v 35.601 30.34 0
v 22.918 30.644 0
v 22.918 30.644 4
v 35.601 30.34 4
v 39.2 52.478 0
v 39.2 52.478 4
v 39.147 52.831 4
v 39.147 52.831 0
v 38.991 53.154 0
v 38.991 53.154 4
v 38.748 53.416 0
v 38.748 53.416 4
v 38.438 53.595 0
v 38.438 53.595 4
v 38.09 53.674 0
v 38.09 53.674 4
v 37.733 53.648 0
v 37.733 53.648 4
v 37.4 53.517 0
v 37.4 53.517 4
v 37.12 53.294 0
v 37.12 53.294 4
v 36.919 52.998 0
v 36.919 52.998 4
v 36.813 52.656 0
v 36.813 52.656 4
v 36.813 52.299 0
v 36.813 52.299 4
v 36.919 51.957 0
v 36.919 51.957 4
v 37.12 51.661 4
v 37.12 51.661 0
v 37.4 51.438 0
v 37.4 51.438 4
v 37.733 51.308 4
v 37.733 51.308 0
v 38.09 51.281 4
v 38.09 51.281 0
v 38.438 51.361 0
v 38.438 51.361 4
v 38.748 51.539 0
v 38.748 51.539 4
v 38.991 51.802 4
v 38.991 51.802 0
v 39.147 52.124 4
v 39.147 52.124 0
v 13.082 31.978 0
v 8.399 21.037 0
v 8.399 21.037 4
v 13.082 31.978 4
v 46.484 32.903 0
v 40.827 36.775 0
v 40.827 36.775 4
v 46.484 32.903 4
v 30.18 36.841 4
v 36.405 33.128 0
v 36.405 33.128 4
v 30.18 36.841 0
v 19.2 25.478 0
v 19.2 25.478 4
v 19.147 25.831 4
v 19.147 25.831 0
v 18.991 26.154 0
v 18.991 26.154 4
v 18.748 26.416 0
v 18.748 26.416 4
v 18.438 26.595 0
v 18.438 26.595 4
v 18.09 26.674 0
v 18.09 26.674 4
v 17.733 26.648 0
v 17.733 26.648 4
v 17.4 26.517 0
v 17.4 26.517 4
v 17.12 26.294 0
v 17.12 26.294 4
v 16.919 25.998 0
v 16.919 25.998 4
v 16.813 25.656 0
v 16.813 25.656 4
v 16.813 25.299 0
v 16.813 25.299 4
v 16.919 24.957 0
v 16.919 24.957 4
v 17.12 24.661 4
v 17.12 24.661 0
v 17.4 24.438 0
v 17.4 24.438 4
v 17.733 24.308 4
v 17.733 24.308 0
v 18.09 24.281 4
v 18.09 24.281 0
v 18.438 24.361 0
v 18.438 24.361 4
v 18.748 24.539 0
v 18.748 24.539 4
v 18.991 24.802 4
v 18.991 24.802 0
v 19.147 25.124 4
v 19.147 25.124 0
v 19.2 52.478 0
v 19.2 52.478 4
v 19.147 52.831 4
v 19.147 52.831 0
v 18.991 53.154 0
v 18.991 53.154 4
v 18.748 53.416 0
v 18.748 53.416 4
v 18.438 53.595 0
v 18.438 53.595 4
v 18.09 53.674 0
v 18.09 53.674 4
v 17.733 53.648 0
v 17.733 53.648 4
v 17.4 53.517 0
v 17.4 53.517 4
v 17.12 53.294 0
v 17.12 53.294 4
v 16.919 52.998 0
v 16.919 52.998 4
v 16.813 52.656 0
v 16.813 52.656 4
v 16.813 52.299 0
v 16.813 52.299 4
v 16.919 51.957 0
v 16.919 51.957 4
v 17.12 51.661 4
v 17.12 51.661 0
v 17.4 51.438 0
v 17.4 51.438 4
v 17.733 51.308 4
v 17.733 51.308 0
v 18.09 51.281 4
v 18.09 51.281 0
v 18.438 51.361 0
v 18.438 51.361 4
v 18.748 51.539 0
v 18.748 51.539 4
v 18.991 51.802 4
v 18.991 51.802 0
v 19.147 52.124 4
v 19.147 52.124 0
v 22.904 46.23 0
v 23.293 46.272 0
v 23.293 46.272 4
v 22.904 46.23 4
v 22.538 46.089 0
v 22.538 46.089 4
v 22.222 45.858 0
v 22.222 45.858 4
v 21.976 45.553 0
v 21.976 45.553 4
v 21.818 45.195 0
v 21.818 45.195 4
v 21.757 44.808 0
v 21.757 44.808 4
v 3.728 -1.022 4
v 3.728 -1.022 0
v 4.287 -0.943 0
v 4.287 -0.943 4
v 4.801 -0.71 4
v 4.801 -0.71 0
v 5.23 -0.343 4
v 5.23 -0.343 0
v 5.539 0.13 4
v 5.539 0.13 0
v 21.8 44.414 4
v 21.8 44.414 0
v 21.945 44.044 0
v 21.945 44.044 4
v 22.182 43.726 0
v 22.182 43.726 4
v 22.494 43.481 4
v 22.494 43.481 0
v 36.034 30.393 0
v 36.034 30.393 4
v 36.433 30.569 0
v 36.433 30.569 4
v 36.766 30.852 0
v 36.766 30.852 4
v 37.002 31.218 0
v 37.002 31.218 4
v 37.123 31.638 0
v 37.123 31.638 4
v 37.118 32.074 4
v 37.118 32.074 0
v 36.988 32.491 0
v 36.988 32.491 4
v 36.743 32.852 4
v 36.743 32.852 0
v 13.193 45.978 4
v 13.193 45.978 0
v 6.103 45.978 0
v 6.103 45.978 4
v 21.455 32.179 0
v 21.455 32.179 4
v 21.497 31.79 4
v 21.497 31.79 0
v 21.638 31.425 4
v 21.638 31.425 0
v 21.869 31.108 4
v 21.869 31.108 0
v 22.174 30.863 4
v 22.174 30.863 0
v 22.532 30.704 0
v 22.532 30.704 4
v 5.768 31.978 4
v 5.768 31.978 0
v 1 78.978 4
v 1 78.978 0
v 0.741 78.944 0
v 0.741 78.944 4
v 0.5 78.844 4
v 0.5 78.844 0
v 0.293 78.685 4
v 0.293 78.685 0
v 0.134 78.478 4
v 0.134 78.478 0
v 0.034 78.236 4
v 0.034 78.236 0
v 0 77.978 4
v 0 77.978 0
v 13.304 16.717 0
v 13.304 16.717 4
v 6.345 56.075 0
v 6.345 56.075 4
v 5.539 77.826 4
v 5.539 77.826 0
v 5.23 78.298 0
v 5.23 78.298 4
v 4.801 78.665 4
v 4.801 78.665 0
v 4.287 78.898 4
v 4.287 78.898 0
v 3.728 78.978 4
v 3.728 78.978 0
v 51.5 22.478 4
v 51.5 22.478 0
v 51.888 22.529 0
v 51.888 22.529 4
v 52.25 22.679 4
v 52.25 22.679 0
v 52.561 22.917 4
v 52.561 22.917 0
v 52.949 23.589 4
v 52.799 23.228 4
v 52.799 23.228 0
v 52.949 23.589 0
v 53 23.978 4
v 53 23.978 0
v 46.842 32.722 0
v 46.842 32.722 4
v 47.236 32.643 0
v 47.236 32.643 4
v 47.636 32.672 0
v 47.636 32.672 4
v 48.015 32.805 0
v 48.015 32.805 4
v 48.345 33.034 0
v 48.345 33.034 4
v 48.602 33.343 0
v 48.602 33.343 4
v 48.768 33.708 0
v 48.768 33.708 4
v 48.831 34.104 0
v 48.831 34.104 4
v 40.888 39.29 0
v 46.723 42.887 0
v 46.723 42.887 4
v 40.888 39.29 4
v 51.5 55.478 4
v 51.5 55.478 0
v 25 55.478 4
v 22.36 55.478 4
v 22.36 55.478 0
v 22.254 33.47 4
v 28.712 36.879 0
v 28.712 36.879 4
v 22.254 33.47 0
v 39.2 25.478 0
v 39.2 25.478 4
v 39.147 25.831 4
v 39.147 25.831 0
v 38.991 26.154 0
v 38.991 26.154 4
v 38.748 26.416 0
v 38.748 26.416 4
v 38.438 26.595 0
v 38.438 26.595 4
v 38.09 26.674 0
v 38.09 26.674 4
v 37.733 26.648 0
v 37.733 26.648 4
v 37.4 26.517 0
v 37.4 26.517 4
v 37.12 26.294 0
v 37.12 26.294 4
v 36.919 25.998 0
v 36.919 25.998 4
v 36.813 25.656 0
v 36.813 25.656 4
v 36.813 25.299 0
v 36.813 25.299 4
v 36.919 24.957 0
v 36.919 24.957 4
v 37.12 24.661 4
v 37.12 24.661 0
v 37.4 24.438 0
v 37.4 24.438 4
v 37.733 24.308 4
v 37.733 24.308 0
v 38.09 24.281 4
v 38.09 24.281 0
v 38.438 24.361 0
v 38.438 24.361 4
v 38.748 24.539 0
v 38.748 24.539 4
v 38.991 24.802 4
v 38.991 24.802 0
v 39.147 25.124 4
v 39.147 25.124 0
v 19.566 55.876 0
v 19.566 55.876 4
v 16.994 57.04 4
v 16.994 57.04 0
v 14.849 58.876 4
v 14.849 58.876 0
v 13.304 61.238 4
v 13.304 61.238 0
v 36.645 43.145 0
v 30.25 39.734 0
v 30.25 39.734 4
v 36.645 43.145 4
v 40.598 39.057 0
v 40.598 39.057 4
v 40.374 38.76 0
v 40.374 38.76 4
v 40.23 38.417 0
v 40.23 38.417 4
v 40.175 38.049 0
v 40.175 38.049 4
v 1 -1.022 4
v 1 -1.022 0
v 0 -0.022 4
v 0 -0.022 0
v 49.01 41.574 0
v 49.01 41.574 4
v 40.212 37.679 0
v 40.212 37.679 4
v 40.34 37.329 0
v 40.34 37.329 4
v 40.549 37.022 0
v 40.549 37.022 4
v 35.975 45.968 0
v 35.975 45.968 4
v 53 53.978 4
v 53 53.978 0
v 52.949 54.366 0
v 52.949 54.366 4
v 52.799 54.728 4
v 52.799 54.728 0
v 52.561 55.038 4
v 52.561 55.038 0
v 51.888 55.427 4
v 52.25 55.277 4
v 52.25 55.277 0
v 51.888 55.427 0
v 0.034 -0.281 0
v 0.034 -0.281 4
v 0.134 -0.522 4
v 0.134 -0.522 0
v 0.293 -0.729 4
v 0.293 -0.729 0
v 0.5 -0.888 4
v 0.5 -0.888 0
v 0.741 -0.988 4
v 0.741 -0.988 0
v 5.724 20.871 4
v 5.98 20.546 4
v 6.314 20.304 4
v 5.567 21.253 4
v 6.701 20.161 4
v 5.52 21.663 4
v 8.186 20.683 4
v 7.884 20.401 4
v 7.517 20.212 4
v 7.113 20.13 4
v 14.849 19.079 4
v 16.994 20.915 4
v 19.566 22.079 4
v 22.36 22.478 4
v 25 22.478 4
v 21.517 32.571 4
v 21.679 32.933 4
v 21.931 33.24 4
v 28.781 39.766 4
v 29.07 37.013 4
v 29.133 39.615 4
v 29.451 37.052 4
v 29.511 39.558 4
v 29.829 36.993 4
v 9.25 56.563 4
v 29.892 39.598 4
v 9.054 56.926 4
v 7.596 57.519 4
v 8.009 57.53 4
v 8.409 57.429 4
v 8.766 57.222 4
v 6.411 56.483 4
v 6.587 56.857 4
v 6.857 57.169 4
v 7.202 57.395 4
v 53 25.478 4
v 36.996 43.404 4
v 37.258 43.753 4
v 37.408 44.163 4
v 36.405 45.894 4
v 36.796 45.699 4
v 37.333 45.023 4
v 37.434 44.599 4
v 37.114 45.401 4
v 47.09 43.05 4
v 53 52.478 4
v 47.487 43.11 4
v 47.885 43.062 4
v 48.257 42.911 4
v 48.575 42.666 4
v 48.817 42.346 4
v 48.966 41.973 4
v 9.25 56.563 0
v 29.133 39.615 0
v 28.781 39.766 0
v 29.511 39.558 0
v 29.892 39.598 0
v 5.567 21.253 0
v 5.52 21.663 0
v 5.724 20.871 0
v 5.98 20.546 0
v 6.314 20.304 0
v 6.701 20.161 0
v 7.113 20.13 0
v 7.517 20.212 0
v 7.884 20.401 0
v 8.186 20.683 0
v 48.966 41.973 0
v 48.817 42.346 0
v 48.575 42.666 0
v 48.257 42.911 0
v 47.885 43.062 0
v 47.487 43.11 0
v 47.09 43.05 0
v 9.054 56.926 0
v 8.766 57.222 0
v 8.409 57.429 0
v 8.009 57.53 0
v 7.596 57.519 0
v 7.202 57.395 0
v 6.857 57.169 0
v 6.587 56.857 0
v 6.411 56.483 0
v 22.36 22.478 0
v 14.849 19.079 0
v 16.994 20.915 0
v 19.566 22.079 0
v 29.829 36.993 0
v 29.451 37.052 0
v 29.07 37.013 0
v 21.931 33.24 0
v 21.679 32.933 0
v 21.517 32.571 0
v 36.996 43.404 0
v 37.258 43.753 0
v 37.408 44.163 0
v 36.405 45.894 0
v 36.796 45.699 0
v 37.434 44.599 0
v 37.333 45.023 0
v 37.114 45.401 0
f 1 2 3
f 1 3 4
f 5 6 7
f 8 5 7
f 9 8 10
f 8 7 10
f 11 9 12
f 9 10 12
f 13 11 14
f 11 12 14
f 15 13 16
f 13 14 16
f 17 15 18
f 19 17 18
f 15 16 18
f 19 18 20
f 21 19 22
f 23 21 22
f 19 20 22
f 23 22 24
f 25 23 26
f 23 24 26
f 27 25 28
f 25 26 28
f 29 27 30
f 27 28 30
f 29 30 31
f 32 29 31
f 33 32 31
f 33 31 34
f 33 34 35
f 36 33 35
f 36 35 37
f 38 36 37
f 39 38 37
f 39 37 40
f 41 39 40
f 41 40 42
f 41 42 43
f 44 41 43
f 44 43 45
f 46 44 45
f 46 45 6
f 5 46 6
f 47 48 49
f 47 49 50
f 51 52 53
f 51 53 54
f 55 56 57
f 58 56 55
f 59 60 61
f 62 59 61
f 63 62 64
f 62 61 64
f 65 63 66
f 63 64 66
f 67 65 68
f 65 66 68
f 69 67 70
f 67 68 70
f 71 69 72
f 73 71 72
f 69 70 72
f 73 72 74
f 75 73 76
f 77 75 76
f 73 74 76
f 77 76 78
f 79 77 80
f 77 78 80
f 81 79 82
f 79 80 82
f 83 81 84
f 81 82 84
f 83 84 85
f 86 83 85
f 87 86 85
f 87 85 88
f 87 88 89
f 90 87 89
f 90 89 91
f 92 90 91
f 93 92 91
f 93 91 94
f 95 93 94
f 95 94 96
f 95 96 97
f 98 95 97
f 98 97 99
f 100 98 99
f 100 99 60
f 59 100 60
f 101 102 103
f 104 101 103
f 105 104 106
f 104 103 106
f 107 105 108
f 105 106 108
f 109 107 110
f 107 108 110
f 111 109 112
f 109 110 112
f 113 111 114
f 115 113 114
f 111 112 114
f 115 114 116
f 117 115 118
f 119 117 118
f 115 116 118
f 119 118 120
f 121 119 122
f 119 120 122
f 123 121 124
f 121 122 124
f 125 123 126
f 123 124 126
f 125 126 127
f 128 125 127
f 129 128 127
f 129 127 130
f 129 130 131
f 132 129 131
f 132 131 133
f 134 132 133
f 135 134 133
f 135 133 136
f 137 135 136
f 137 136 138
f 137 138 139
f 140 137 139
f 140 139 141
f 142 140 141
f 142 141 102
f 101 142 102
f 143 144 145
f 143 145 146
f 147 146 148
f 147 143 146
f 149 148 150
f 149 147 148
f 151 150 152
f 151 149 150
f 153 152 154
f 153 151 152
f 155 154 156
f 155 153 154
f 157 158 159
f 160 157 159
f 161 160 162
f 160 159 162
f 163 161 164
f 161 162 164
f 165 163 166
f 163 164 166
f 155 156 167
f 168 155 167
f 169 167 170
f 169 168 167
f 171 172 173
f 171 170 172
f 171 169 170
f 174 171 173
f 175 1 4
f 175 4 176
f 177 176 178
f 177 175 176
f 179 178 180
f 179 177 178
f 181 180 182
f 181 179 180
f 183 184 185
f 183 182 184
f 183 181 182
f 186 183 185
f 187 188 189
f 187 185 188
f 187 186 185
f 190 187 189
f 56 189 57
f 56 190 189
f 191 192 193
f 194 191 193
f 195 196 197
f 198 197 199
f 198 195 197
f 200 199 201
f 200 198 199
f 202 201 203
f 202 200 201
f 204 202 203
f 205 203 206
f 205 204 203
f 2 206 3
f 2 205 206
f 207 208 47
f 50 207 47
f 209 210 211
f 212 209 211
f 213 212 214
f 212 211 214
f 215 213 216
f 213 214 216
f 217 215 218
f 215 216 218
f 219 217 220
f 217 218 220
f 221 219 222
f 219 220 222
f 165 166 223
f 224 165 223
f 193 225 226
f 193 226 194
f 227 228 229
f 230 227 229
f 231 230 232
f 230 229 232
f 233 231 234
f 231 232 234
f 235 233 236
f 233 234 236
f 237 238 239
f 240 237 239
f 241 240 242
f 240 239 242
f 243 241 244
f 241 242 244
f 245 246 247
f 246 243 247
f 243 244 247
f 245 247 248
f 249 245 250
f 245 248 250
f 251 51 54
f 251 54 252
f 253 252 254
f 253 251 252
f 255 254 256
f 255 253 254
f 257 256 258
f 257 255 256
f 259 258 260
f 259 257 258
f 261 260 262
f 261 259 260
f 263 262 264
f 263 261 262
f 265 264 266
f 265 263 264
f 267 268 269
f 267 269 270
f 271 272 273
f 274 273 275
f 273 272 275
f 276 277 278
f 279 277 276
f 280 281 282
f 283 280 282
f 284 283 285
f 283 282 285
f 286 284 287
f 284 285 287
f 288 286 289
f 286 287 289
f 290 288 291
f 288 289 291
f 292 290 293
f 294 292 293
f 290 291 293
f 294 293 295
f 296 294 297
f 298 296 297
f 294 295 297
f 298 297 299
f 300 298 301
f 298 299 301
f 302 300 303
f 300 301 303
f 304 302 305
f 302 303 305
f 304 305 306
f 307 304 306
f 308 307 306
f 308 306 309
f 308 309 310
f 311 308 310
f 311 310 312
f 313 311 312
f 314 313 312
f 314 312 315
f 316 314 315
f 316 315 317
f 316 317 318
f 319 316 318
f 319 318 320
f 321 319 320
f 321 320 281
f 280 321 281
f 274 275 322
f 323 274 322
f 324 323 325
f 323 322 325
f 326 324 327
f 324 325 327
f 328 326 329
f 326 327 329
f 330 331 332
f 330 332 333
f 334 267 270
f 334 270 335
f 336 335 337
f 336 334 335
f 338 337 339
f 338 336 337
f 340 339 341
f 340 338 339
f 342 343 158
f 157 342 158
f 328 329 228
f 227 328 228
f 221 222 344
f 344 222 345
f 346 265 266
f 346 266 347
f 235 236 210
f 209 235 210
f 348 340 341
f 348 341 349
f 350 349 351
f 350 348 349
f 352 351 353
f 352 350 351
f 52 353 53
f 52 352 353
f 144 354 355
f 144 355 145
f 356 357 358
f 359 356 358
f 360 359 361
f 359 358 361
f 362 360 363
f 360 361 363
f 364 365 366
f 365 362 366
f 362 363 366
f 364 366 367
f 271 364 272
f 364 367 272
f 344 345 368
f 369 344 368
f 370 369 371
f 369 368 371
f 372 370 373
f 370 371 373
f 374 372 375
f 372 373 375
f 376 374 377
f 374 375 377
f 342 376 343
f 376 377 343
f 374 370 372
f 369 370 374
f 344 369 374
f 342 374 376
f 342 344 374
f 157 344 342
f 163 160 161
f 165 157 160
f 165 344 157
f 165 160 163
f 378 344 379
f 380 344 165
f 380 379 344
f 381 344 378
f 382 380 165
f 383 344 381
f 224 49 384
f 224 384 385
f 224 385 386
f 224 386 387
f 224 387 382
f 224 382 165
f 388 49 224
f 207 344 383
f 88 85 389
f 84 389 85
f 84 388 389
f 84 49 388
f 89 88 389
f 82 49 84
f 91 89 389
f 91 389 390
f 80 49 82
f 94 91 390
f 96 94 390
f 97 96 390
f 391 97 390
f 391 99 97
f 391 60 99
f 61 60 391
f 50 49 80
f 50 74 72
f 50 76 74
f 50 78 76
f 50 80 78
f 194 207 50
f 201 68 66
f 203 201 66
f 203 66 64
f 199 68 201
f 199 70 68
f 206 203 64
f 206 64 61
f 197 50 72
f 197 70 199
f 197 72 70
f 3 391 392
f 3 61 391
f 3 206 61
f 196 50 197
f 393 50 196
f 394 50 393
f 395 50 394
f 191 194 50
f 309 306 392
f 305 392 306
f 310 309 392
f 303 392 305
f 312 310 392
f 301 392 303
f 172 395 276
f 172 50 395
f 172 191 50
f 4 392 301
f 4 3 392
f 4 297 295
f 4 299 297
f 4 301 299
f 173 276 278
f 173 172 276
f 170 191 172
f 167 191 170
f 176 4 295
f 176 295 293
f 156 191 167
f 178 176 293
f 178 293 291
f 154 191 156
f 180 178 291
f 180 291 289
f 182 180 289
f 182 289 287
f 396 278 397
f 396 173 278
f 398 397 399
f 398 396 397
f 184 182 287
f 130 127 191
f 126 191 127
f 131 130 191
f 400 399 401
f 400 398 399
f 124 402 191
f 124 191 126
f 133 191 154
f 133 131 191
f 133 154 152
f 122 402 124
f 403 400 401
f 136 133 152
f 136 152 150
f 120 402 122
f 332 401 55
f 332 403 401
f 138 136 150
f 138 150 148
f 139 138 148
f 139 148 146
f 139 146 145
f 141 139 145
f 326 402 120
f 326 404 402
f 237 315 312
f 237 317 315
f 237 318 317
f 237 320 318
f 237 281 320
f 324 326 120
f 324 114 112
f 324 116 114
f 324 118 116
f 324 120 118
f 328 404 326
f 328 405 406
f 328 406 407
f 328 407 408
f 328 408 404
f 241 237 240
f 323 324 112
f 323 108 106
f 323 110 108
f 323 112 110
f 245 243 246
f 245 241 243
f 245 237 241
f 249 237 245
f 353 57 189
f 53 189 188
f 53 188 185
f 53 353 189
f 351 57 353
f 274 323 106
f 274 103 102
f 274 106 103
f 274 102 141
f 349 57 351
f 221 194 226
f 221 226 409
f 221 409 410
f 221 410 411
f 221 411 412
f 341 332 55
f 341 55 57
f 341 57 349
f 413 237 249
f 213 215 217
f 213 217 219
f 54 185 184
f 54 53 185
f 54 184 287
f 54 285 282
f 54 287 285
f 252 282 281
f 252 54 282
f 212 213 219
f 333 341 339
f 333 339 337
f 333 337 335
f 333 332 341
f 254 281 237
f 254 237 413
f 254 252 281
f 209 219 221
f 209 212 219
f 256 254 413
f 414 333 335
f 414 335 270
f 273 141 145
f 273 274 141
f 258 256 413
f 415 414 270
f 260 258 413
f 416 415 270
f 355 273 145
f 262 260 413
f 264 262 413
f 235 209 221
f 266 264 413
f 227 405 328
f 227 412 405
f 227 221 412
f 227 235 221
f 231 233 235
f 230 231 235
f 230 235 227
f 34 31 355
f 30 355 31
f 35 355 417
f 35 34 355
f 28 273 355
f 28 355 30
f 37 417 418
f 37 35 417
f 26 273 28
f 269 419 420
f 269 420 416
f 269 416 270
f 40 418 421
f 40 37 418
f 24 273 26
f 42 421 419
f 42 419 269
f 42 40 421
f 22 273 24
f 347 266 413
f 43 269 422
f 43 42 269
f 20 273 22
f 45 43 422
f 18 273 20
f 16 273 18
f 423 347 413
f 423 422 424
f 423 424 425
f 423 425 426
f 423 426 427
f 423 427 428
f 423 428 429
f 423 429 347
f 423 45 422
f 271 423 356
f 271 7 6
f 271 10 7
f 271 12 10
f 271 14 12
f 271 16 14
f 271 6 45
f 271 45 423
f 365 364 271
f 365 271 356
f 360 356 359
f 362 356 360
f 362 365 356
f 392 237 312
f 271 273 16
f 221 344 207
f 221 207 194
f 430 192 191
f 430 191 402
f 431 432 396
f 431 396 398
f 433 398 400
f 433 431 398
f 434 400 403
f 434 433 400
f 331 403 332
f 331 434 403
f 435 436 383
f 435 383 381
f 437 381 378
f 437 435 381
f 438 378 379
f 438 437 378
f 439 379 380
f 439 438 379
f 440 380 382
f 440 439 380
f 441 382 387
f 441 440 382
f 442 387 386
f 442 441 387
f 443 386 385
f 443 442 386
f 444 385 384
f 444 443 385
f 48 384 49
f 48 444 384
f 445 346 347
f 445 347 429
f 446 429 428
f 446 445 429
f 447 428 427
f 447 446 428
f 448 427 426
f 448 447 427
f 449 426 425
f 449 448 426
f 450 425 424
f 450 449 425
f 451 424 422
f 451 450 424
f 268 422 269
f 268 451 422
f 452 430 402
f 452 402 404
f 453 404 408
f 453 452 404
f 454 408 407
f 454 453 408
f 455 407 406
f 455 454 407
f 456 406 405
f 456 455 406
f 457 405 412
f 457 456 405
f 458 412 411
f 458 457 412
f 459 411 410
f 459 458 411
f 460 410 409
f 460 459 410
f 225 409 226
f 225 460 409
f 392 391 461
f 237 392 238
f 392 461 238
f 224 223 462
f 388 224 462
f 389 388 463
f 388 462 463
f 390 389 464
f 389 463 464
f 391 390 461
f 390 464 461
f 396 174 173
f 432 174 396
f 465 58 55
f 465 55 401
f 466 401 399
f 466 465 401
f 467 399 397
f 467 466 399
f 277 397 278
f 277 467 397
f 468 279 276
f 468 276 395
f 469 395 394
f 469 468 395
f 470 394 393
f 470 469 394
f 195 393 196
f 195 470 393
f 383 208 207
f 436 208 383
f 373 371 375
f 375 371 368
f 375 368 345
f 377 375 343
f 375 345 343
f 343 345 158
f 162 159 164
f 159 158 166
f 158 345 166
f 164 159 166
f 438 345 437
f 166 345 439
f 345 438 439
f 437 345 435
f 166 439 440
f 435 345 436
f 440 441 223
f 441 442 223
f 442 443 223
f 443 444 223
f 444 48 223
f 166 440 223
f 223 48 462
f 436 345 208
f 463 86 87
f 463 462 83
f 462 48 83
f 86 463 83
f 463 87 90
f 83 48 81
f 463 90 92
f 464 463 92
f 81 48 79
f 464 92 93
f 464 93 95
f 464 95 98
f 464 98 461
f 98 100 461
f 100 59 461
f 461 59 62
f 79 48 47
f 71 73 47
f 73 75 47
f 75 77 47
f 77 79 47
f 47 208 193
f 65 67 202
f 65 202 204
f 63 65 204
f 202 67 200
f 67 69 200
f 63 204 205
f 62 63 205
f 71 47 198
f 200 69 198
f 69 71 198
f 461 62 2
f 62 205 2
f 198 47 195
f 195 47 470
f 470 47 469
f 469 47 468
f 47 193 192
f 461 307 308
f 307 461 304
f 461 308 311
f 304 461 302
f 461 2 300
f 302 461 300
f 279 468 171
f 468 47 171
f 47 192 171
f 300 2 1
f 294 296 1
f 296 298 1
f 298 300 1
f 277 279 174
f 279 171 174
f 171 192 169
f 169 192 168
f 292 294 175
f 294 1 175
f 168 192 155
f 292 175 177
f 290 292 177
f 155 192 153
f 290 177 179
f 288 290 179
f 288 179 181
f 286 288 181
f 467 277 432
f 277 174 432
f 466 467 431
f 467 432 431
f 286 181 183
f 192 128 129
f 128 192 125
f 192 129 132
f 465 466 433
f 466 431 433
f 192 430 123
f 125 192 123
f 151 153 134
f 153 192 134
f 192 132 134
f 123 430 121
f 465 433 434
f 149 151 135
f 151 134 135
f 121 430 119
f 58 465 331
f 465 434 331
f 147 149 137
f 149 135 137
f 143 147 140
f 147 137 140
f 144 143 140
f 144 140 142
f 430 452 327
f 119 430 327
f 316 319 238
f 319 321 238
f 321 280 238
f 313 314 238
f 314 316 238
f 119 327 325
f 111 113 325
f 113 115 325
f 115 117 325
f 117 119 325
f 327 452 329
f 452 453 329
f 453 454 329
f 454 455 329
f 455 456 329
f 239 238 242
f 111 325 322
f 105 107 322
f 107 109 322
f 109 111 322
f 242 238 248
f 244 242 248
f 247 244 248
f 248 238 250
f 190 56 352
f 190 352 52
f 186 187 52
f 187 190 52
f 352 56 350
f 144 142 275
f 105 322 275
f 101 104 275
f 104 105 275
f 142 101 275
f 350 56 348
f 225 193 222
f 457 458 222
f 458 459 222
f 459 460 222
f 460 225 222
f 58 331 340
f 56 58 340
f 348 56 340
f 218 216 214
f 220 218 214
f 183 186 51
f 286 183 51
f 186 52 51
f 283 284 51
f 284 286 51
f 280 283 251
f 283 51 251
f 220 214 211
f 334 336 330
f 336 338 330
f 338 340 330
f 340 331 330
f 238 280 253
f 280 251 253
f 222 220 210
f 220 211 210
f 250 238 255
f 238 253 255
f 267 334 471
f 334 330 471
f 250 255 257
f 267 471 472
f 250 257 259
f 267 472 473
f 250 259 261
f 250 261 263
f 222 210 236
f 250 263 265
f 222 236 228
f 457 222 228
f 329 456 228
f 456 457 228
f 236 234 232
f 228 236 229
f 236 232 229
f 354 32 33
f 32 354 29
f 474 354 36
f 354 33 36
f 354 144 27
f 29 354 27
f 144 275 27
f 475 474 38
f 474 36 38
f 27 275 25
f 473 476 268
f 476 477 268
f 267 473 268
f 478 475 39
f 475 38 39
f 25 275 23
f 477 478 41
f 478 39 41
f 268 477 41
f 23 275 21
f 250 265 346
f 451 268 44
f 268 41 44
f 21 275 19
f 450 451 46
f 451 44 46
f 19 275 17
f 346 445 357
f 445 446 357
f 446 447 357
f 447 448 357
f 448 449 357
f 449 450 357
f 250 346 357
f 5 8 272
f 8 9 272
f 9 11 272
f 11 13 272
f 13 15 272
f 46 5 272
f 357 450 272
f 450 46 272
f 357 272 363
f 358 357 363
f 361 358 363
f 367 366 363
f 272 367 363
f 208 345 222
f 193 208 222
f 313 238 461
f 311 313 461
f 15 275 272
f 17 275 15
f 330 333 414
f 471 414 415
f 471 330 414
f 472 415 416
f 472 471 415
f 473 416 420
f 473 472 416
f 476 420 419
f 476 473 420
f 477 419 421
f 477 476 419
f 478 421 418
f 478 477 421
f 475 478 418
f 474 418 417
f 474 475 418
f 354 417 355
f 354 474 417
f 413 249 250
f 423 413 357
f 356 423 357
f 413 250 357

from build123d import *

# Parameters (mm, degrees)
EXTRUDE_1_DEPTH     = 11
CUT_EXTRUDE_START   = -7
CUT_EXTRUDE_1_DEPTH = 7
SKETCH_3_R          = 2.05
CUT_EXTRUDE_2_DEPTH = 37
FILLET_1_R          = 2
EXTRUDE_START       = -4
EXTRUDE_2_DEPTH     = 4
SKETCH_5_W          = 34.461524683
SKETCH_5_H          = 8.345685775
CUT_EXTRUDE_3_DEPTH = 34
SKETCH_6_R          = 1.2
CUT_EXTRUDE_4_DEPTH = 10


with BuildPart() as part:
    # 草图1 → 凸台-拉伸1 (new body)
    with BuildSketch(Plane.XY):
        with BuildLine():
            Line((3.72790966, 78.977626184), (1, 78.977626184))
            ThreePointArc((1, 78.977626184), (0.292893219, 78.684732965), (0, 77.977626184))
            Line((0, 77.977626184), (0, -0.022373816))
            ThreePointArc((0, -0.022373816), (0.292893219, -0.729480597), (1, -1.022373816))
            Line((1, -1.022373816), (3.72790966, -1.022373816))
            ThreePointArc((3.72790966, -1.022373816), (4.801278091, -0.709940174), (5.539290113, 0.129745972))
            Line((5.539290113, 0.129745972), (13.303549433, 16.717027245))
            ThreePointArc((13.303549433, 16.717027245), (16.993609545, 20.915457973), (22.360451698, 22.477626184))
            Line((22.360451698, 22.477626184), (51.5, 22.477626184))
            ThreePointArc((51.5, 22.477626184), (52.560660172, 22.916966012), (53, 23.977626184))
            Line((53, 23.977626184), (53, 53.977626184))
            ThreePointArc((53, 53.977626184), (52.560660172, 55.038286356), (51.5, 55.477626184))
            Line((51.5, 55.477626184), (22.360451698, 55.477626184))
            ThreePointArc((22.360451698, 55.477626184), (16.993609545, 57.039794395), (13.303549433, 61.238225124))
            Line((13.303549433, 61.238225124), (5.539290113, 77.825506396))
            ThreePointArc((5.539290113, 77.825506396), (4.801278091, 78.665192542), (3.72790966, 78.977626184))
        make_face()
        with BuildLine():
            Line((46.723063893, 42.88691809), (40.887588257, 39.289675292))
            ThreePointArc((40.887588257, 39.289675292), (40.373853978, 38.759625352), (40.175145399, 38.048716955))
            ThreePointArc((40.175145399, 38.048716955), (40.339583189, 37.329108685), (40.827345936, 36.77506595))
            Line((40.827345936, 36.77506595), (46.483868127, 32.90251016))
            ThreePointArc((46.483868127, 32.90251016), (48.014920506, 32.805104134), (48.830807058, 34.104310989))
            Line((48.830807058, 34.104310989), (49.009760503, 41.574109577))
            ThreePointArc((49.009760503, 41.574109577), (48.257024254, 42.91089582), (46.723063893, 42.88691809))
        make_face(mode=Mode.SUBTRACT)
        with BuildLine():
            Line((35.975157614, 45.967771208), (23.29289503, 46.27159929))
            ThreePointArc((23.29289503, 46.27159929), (22.222016888, 45.857788357), (21.757400208, 44.807954643))
            ThreePointArc((21.757400208, 44.807954643), (21.945365563, 44.044228792), (22.493939434, 43.480602267))
            Line((22.493939434, 43.480602267), (28.780793319, 39.766059947))
            ThreePointArc((28.780793319, 39.766059947), (29.511034587, 39.557845657), (30.249678725, 39.733943182))
            Line((30.249678725, 39.733943182), (36.645087423, 43.144657419))
            ThreePointArc((36.645087423, 43.144657419), (37.398702379, 44.814536207), (35.975157614, 45.967771208))
        make_face(mode=Mode.SUBTRACT)
        with BuildLine():
            Line((28.711627706, 36.878978358), (22.254110192, 33.469752057))
            ThreePointArc((22.254110192, 33.469752057), (21.679175619, 32.933041346), (21.454853835, 32.179192628))
            ThreePointArc((21.454853835, 32.179192628), (21.868664769, 31.108314486), (22.918498482, 30.643697806))
            Line((22.918498482, 30.643697806), (35.600761065, 30.339869724))
            ThreePointArc((35.600761065, 30.339869724), (37.077896972, 31.42361332), (36.405111016, 33.127664295))
            Line((36.405111016, 33.127664295), (30.180365947, 36.840718678))
            ThreePointArc((30.180365947, 36.840718678), (29.451001862, 37.051985174), (28.711627706, 36.878978358))
        make_face(mode=Mode.SUBTRACT)
        with BuildLine():
            Line((8.398953615, 21.036666397), (15.693636896, 38.077972893))
            ThreePointArc((15.693636896, 38.077972893), (15.814233328, 38.63232963), (15.720321381, 39.191825329))
            Line((15.720321381, 39.191825329), (9.25005307, 56.562897813))
            ThreePointArc((9.25005307, 56.562897813), (7.596092236, 57.518632984), (6.344825548, 56.075252289))
            Line((6.344825548, 56.075252289), (5.520410579, 21.66287331))
            ThreePointArc((5.520410579, 21.66287331), (6.701123529, 20.161229848), (8.398953615, 21.036666397))
        make_face(mode=Mode.SUBTRACT)
    extrude(amount=EXTRUDE_1_DEPTH)

    # 草图2 → 切除-拉伸1 (cut)
    with BuildSketch(Plane.XY.offset(11).offset(CUT_EXTRUDE_START)):
        with BuildLine():
            Line((23, 22.477626184), (23, 27.477626184))
            Line((23, 27.477626184), (53, 27.477626184))
            Line((53, 27.477626184), (53, 50.477626184))
            Line((53, 50.477626184), (23, 50.477626184))
            Line((23, 50.477626184), (23, 55.477626184))
            Line((23, 55.477626184), (22.360451698, 55.477626184))
            ThreePointArc((22.360451698, 55.477626184), (16.993609545, 57.039794395), (13.303549433, 61.238225124))
            Line((13.303549433, 61.238225124), (5.539290113, 77.825506396))
            ThreePointArc((5.539290113, 77.825506396), (4.801278091, 78.665192542), (3.72790966, 78.977626184))
            Line((3.72790966, 78.977626184), (1, 78.977626184))
            ThreePointArc((1, 78.977626184), (0.292893219, 78.684732965), (0, 77.977626184))
            Line((0, 77.977626184), (0, -0.022373816))
            ThreePointArc((0, -0.022373816), (0.292893219, -0.729480597), (1, -1.022373816))
            Line((1, -1.022373816), (3.72790966, -1.022373816))
            ThreePointArc((3.72790966, -1.022373816), (4.801278091, -0.709940174), (5.539290113, 0.129745972))
            Line((5.539290113, 0.129745972), (13.303549433, 16.717027245))
            ThreePointArc((13.303549433, 16.717027245), (16.993609545, 20.915457973), (22.360451698, 22.477626184))
            Line((22.360451698, 22.477626184), (23, 22.477626184))
        make_face()
    extrude(amount=CUT_EXTRUDE_1_DEPTH, mode=Mode.SUBTRACT)

    # 草图3 → 切除-拉伸2 (cut)
    with BuildSketch(Plane(origin=(0, 55.477626184, 0), x_dir=(1, 0, 0), z_dir=(0, 1, 0))):
        with Locations(Location((48, -8, 0), (0, 0, 180))):
            Circle(SKETCH_3_R)
        with Locations(Location((28, -8, 0), (0, 0, 180))):
            Circle(SKETCH_3_R)
    extrude(amount=-CUT_EXTRUDE_2_DEPTH, mode=Mode.SUBTRACT)

    # 圆角1
    fillet_1_edges = [part.edges().sort_by_distance(p)[0] for p in [
        (53, 50.477626184, 7.5),
        (53, 27.477626184, 7.5),
        (23, 27.477626184, 7.5),
        (23, 22.477626184, 7.5),
        (23, 55.477626184, 7.5),
        (23, 50.477626184, 7.5),
    ]]
    fillet(fillet_1_edges, radius=FILLET_1_R)

    # 草图4 → 凸台-拉伸2 (add)
    with BuildSketch(Plane.XY.offset(4).offset(EXTRUDE_START)):
        with BuildLine():
            Line((5.935218909, 38.977626184), (15.782413333, 38.977626184))
            ThreePointArc((15.782413333, 38.977626184), (15.755353714, 39.08588132), (15.720321381, 39.191825329))
            Line((15.720321381, 39.191825329), (13.192788767, 45.977626184))
            Line((13.192788767, 45.977626184), (6.102917422, 45.977626184))
            Line((6.102917422, 45.977626184), (5.935218909, 38.977626184))
        make_face()
        with BuildLine():
            Line((5.767520396, 31.977626184), (13.082329062, 31.977626184))
            Line((13.082329062, 31.977626184), (15.693636896, 38.077972893))
            ThreePointArc((15.693636896, 38.077972893), (15.807413415, 38.520952405), (15.782413333, 38.977626184))
            Line((15.782413333, 38.977626184), (5.935218909, 38.977626184))
            Line((5.935218909, 38.977626184), (5.767520396, 31.977626184))
        make_face()
    extrude(amount=EXTRUDE_2_DEPTH)

    # 草图5 → 切除-拉伸3 (cut)
    with BuildSketch(Plane(origin=(0, 55.477626184, 0), x_dir=(1, 0, 0), z_dir=(0, 1, 0))):
        with Locations((40.230762341, -8.172842887)):
            Rectangle(SKETCH_5_W, SKETCH_5_H)
    extrude(amount=-CUT_EXTRUDE_3_DEPTH, mode=Mode.SUBTRACT)

    # 草图6 → 切除-拉伸4 (cut)
    with BuildSketch(Plane.XY.offset(4)):
        with Locations((38, 52.477626184)):
            Circle(SKETCH_6_R)
        with Locations((18, 52.477626184)):
            Circle(SKETCH_6_R)
        with Locations((18, 25.477626184)):
            Circle(SKETCH_6_R)
        with Locations((38, 25.477626184)):
            Circle(SKETCH_6_R)
    extrude(amount=-CUT_EXTRUDE_4_DEPTH, mode=Mode.SUBTRACT)


solid = part.part
